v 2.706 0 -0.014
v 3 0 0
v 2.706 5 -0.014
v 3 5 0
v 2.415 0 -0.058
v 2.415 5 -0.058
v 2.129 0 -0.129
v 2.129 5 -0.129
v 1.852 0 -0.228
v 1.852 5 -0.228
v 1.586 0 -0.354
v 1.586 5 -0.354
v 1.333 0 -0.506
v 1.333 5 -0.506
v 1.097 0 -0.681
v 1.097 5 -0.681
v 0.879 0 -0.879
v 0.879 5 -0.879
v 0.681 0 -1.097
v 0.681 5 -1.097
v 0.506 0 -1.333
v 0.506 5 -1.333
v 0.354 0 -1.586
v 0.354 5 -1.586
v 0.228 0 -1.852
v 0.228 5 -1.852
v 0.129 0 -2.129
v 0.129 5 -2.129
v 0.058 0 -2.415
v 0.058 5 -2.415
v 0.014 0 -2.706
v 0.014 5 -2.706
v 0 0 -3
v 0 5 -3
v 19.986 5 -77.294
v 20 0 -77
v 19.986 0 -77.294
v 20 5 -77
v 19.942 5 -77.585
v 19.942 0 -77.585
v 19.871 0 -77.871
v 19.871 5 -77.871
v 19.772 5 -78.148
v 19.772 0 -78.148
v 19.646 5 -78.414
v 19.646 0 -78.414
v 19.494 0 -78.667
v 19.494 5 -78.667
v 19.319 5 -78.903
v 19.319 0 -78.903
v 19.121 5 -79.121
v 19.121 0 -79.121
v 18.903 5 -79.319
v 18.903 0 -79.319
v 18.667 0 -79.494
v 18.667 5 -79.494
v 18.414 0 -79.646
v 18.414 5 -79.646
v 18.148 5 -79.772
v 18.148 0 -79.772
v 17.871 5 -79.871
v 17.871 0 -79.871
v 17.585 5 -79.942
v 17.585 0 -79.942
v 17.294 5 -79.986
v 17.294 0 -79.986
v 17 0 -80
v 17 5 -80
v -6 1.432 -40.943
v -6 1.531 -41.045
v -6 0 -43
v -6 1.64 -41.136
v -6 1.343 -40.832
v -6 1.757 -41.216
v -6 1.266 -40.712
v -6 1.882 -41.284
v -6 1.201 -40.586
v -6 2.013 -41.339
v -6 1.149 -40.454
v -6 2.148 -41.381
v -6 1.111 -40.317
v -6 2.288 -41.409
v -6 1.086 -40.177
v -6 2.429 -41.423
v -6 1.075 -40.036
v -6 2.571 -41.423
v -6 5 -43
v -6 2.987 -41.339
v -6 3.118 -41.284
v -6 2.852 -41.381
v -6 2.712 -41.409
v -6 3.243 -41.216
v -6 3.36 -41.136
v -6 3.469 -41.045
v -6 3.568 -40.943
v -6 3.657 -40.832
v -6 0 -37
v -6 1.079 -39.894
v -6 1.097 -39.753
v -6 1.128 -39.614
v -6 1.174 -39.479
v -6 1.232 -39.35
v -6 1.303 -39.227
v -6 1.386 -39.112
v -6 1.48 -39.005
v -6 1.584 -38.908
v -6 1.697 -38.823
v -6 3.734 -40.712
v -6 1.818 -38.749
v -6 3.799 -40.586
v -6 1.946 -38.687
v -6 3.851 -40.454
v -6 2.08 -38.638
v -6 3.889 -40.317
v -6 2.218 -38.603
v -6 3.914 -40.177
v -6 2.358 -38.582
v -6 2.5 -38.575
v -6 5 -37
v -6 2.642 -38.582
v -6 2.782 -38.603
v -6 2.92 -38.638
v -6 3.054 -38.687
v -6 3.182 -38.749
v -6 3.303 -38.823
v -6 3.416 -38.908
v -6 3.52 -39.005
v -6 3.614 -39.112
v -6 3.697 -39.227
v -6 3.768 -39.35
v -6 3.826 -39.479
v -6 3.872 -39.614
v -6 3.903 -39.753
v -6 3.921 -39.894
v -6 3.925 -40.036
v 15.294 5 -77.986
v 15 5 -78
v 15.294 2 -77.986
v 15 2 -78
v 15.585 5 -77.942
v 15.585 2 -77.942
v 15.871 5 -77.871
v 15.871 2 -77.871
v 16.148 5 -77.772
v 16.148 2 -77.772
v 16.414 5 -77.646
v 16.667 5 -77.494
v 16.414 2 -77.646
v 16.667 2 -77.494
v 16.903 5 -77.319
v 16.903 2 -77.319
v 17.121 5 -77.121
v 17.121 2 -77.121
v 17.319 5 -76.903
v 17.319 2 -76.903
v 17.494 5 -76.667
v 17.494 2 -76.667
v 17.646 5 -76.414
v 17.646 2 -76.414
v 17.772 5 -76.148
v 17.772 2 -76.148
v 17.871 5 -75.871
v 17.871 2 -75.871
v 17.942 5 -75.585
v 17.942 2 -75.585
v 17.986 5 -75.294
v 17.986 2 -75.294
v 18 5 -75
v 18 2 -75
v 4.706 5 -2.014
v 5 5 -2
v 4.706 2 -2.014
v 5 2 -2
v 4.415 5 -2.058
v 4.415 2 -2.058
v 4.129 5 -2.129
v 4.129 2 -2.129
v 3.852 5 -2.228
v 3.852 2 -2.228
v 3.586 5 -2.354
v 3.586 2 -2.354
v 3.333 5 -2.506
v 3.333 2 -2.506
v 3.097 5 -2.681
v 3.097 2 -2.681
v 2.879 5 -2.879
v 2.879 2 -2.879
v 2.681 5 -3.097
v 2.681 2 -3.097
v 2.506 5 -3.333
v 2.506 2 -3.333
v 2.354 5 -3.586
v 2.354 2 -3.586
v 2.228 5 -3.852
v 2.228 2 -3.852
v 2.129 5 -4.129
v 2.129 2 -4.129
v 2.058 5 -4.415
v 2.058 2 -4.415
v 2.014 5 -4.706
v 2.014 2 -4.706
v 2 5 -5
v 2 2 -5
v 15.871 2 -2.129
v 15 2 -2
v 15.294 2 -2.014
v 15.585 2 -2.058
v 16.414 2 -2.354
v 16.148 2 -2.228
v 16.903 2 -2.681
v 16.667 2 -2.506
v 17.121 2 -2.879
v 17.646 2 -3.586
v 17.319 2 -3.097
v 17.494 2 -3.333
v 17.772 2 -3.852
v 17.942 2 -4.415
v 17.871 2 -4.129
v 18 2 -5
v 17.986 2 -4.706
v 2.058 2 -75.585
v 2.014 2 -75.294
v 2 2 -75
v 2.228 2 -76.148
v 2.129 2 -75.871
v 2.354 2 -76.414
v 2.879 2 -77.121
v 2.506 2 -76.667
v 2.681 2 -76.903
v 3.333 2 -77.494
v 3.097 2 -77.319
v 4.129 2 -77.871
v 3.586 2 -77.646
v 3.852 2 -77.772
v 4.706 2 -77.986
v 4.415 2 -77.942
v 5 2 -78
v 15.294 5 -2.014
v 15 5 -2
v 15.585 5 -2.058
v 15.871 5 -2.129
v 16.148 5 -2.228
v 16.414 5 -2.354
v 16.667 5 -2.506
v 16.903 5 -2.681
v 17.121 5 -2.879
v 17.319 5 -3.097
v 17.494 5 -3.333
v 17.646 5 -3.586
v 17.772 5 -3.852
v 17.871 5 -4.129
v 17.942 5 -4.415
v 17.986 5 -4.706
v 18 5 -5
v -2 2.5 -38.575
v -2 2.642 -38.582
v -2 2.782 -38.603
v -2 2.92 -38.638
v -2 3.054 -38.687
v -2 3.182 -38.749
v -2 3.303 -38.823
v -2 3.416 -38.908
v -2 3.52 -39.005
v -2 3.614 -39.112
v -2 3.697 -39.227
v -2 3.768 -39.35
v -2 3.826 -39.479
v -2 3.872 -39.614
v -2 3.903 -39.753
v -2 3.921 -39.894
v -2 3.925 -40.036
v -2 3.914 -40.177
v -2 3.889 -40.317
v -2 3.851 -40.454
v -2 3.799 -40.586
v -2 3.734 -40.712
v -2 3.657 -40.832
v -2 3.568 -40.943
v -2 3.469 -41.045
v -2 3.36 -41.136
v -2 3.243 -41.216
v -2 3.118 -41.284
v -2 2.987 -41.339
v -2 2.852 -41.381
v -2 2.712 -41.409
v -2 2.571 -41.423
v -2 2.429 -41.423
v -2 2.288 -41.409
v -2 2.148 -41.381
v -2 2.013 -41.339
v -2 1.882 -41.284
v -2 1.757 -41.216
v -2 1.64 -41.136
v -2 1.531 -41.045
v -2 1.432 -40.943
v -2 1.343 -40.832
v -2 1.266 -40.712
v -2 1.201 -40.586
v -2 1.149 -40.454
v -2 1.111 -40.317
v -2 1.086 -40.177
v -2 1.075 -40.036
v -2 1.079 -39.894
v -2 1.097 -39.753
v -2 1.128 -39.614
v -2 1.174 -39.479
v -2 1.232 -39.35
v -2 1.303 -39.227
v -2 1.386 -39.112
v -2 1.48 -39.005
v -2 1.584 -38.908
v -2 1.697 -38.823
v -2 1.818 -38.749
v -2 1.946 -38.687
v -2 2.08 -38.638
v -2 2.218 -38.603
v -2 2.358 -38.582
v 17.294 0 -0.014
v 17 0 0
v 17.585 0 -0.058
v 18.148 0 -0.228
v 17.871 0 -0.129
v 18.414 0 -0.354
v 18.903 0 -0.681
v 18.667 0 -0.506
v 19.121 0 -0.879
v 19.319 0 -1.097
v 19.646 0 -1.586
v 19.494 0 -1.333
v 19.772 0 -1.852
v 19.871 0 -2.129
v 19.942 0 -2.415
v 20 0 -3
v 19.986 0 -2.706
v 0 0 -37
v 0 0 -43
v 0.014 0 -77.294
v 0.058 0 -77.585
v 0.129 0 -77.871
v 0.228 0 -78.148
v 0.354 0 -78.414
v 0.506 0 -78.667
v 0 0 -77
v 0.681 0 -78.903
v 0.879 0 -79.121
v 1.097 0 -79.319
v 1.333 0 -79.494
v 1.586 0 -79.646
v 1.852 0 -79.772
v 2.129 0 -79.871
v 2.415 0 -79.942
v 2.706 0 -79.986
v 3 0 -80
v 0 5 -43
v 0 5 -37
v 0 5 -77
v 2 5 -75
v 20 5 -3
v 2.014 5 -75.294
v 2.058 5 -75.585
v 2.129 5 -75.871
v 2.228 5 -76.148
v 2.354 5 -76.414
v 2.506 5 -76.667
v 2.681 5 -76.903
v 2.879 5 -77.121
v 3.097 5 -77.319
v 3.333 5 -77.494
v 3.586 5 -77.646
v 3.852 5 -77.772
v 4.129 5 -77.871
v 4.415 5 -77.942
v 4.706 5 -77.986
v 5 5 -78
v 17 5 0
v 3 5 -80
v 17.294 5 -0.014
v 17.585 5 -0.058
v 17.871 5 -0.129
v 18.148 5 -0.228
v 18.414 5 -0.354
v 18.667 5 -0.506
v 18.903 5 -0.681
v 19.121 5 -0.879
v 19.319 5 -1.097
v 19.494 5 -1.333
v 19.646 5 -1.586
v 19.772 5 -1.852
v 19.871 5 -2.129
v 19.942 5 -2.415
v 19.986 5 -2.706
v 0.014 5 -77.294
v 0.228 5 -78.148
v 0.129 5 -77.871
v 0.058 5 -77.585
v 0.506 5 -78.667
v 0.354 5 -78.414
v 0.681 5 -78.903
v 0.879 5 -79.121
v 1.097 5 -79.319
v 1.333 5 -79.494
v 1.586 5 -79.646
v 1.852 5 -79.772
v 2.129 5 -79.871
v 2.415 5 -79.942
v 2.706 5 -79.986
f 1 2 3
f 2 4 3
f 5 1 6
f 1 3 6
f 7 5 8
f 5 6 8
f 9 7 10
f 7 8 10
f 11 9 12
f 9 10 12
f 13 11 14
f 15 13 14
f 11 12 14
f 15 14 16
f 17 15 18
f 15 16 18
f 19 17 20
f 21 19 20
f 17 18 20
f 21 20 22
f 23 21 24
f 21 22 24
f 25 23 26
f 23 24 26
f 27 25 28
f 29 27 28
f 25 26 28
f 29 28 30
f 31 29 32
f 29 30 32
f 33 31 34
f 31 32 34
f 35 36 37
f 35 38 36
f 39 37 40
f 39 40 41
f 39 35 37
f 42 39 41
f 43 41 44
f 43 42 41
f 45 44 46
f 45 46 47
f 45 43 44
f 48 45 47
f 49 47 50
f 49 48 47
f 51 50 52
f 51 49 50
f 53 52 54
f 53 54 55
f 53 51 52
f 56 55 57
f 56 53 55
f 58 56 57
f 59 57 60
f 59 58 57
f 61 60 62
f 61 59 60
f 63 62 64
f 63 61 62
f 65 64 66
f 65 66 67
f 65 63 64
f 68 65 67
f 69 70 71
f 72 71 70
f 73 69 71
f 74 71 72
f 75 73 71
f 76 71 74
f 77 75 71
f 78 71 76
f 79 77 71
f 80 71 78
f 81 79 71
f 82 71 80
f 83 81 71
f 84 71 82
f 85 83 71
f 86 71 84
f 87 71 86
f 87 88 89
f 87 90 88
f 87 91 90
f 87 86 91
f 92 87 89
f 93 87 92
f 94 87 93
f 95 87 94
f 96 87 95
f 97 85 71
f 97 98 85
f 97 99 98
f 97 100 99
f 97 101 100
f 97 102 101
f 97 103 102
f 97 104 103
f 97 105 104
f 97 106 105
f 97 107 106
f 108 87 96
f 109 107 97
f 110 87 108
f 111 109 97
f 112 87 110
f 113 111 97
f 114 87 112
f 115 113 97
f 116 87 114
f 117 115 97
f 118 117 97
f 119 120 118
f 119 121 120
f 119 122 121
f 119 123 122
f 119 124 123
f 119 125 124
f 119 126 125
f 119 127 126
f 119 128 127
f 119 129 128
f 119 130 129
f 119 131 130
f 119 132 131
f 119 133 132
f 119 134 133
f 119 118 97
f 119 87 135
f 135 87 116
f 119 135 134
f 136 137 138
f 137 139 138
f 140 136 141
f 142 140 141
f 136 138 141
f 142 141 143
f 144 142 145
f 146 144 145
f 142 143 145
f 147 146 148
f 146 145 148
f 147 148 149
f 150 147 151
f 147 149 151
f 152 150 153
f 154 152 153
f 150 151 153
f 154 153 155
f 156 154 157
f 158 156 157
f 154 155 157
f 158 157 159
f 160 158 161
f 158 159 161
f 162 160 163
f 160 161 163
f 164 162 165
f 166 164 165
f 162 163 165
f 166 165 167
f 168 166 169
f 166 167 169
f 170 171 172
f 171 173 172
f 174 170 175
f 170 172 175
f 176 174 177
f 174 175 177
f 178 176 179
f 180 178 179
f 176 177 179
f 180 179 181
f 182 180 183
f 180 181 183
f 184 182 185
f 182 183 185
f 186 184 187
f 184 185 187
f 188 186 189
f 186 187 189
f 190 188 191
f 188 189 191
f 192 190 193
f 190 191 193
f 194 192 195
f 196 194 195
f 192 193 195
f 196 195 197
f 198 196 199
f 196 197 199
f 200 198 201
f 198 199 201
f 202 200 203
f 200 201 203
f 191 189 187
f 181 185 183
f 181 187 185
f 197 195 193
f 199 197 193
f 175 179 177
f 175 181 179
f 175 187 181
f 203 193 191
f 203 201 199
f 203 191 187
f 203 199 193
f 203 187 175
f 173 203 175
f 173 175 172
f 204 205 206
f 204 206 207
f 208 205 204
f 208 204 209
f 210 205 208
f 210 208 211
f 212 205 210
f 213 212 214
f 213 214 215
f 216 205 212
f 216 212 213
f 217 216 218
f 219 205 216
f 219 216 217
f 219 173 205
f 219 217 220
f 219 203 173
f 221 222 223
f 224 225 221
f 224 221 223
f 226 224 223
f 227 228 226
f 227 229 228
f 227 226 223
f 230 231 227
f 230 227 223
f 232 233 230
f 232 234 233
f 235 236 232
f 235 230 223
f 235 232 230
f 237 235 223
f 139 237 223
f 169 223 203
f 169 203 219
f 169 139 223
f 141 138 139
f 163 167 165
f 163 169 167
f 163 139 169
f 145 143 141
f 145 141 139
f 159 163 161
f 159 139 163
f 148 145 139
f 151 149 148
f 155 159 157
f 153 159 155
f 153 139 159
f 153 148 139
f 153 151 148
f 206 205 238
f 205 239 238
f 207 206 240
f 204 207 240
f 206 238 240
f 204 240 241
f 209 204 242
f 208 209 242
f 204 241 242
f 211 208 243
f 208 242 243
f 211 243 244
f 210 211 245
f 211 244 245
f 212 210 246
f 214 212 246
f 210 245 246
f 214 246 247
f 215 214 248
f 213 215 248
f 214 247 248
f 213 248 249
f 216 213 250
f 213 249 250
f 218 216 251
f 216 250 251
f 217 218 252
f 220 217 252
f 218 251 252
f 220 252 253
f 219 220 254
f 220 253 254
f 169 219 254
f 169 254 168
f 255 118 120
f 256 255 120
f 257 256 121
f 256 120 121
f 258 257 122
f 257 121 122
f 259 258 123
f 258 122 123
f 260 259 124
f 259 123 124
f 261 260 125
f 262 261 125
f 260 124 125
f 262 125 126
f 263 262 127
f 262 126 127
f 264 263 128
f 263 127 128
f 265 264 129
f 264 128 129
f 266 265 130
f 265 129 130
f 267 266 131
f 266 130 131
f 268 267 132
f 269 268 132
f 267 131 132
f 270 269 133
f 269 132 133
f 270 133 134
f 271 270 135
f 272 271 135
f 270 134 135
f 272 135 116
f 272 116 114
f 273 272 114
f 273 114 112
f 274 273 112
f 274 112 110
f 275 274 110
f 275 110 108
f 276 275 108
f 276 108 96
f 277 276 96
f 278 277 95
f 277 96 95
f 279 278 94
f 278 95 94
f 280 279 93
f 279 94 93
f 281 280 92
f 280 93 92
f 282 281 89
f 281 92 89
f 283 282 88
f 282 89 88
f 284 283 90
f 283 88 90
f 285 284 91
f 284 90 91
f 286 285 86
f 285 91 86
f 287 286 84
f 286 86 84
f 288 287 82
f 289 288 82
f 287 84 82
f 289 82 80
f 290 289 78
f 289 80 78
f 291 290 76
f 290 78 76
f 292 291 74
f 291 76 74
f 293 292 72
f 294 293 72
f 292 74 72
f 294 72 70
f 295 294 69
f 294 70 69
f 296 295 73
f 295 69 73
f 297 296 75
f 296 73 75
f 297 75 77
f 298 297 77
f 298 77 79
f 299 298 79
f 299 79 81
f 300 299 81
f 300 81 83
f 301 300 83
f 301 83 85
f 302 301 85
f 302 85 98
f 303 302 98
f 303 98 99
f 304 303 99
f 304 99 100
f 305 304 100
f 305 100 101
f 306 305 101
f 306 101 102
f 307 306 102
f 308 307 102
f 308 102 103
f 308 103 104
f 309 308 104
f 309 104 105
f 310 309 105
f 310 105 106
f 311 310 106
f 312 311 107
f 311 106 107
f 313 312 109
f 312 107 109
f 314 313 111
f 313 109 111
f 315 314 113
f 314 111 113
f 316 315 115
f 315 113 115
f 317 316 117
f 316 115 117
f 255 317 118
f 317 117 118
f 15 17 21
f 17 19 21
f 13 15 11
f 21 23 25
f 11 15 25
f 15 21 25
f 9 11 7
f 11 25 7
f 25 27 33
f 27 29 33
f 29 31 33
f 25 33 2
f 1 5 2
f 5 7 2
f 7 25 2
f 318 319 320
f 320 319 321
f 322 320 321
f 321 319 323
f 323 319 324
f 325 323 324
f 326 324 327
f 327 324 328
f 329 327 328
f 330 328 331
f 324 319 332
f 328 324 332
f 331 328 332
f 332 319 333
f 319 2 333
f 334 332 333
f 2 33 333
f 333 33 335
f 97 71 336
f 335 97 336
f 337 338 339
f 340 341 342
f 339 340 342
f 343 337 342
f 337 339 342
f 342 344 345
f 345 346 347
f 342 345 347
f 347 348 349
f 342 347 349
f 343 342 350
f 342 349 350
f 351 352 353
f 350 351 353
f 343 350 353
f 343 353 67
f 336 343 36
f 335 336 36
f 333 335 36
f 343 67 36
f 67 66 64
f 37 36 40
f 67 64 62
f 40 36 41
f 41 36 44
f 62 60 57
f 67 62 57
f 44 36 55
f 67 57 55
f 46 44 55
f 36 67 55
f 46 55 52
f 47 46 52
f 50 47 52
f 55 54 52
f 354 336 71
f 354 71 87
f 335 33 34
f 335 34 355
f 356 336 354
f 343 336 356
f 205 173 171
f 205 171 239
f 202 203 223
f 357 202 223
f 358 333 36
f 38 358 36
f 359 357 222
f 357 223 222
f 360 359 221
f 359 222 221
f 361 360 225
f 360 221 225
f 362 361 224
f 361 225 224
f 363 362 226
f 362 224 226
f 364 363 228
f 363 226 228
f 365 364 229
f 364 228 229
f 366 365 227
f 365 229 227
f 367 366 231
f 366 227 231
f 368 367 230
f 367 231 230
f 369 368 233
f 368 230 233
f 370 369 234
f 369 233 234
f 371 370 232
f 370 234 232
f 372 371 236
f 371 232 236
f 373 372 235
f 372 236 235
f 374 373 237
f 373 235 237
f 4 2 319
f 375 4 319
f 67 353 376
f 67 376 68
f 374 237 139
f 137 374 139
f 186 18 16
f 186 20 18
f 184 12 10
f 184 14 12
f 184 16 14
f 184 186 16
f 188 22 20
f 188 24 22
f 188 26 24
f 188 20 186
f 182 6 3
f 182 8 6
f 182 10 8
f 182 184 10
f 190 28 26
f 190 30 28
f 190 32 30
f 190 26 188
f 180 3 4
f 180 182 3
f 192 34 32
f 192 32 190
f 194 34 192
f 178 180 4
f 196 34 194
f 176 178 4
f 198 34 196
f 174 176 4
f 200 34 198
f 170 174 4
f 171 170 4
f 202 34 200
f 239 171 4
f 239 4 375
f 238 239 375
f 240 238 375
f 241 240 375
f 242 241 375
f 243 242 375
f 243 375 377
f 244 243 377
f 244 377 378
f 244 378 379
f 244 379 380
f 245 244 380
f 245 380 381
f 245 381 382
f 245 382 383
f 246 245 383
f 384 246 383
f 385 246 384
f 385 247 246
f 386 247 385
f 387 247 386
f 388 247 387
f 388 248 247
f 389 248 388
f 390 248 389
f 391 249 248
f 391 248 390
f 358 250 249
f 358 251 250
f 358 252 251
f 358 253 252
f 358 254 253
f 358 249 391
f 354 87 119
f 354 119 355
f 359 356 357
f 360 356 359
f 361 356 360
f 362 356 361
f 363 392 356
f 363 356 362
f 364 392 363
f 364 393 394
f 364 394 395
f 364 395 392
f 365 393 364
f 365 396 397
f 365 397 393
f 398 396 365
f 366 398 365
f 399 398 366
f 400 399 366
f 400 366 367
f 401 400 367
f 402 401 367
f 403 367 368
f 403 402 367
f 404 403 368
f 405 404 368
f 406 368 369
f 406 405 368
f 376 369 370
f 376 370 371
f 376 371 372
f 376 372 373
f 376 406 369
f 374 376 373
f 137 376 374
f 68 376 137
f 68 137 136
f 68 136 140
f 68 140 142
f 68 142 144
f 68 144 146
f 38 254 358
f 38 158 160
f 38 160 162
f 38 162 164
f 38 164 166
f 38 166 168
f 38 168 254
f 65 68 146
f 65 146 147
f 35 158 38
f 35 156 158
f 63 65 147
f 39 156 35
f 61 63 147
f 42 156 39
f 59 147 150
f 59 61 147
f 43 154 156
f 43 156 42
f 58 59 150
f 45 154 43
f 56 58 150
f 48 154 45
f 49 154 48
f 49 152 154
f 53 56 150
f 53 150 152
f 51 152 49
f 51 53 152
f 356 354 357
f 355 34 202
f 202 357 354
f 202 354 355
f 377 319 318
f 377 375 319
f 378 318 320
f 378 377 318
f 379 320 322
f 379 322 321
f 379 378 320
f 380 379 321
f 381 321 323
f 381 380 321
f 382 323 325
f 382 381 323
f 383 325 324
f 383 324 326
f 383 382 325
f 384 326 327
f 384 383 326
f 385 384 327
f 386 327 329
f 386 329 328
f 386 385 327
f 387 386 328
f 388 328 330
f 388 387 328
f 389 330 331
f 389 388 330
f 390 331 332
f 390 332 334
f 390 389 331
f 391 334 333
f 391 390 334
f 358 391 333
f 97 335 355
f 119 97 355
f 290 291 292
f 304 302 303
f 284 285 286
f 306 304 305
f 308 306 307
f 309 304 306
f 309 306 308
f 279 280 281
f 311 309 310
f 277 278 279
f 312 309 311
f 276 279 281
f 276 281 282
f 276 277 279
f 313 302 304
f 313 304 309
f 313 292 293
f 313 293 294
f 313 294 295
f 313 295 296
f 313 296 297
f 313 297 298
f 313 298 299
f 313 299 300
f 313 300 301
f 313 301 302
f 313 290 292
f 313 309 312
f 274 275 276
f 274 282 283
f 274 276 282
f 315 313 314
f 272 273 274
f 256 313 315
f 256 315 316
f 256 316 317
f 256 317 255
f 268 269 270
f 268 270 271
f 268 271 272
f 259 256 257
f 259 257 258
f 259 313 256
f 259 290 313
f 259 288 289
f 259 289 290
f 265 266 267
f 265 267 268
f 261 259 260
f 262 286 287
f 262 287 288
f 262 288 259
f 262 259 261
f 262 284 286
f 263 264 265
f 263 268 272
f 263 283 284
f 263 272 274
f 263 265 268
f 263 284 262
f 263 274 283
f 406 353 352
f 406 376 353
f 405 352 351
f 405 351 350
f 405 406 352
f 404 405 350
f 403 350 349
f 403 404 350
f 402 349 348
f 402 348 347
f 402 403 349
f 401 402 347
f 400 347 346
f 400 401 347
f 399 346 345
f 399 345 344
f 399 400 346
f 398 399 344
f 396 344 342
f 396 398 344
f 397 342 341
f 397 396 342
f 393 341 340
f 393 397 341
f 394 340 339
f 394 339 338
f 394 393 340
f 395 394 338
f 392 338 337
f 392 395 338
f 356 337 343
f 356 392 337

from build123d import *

# Parameters (mm, degrees)
SKETCH1_W           = 20
SKETCH1_H           = 80
BOSS_EXTRUDE1_DEPTH = 5
SHELL1_T            = -2
FILLET1_R           = 3
FILLET2_R           = 3
FILLET3_R           = 3
FILLET4_R           = 3
FILLET5_R           = 3
FILLET6_R           = 3
FILLET7_R           = 3
FILLET8_R           = 3
SKETCH2_W           = 6
SKETCH2_H           = 5
BOSS_EXTRUDE2_DEPTH = 6
SKETCH3_R           = 1.425
CUT_EXTRUDE1_DEPTH  = 4


with BuildPart() as part:
    # Sketch1 → Boss-Extrude1 (new body)
    with BuildSketch(Plane(origin=(0, 0, 0), x_dir=(1, 0, 0), z_dir=(0, 1, 0))):
        with Locations((10, 40)):
            Rectangle(SKETCH1_W, SKETCH1_H)
    extrude(amount=BOSS_EXTRUDE1_DEPTH)

    # Shell1
    shell1_openings = [part.faces().sort_by_distance(p)[0] for p in [
        (10, 5, -40),
    ]]
    offset(amount=SHELL1_T, openings=shell1_openings, kind=Kind.INTERSECTION)

    # Fillet1
    fillet1_edges = [part.edges().sort_by_distance(p)[0] for p in [
        (20, 2.5, 0),
    ]]
    fillet(fillet1_edges, radius=FILLET1_R)

    # Fillet2
    fillet2_edges = [part.edges().sort_by_distance(p)[0] for p in [
        (0, 2.5, 0),
    ]]
    fillet(fillet2_edges, radius=FILLET2_R)

    # Fillet3
    fillet3_edges = [part.edges().sort_by_distance(p)[0] for p in [
        (20, 2.5, -80),
    ]]
    fillet(fillet3_edges, radius=FILLET3_R)

    # Fillet4
    fillet4_edges = [part.edges().sort_by_distance(p)[0] for p in [
        (0, 2.5, -80),
    ]]
    fillet(fillet4_edges, radius=FILLET4_R)

    # Fillet5
    fillet5_edges = [part.edges().sort_by_distance(p)[0] for p in [
        (2, 3.5, -2),
    ]]
    fillet(fillet5_edges, radius=FILLET5_R)

    # Fillet6
    fillet6_edges = [part.edges().sort_by_distance(p)[0] for p in [
        (18, 3.5, -2),
    ]]
    fillet(fillet6_edges, radius=FILLET6_R)

    # Fillet7
    fillet7_edges = [part.edges().sort_by_distance(p)[0] for p in [
        (2, 3.5, -78),
    ]]
    fillet(fillet7_edges, radius=FILLET7_R)

    # Fillet8
    fillet8_edges = [part.edges().sort_by_distance(p)[0] for p in [
        (18, 3.5, -78),
    ]]
    fillet(fillet8_edges, radius=FILLET8_R)

    # Sketch2 → Boss-Extrude2 (add)
    with BuildSketch(Plane.ZY):
        with Locations((-40, 2.5)):
            Rectangle(SKETCH2_W, SKETCH2_H)
    extrude(amount=BOSS_EXTRUDE2_DEPTH)

    # Sketch3 → Cut-Extrude1 (cut)
    with BuildSketch(Plane.ZY.offset(6)):
        with Locations((-40, 2.5)):
            Circle(SKETCH3_R)
    extrude(amount=-CUT_EXTRUDE1_DEPTH, mode=Mode.SUBTRACT)


solid = part.part
